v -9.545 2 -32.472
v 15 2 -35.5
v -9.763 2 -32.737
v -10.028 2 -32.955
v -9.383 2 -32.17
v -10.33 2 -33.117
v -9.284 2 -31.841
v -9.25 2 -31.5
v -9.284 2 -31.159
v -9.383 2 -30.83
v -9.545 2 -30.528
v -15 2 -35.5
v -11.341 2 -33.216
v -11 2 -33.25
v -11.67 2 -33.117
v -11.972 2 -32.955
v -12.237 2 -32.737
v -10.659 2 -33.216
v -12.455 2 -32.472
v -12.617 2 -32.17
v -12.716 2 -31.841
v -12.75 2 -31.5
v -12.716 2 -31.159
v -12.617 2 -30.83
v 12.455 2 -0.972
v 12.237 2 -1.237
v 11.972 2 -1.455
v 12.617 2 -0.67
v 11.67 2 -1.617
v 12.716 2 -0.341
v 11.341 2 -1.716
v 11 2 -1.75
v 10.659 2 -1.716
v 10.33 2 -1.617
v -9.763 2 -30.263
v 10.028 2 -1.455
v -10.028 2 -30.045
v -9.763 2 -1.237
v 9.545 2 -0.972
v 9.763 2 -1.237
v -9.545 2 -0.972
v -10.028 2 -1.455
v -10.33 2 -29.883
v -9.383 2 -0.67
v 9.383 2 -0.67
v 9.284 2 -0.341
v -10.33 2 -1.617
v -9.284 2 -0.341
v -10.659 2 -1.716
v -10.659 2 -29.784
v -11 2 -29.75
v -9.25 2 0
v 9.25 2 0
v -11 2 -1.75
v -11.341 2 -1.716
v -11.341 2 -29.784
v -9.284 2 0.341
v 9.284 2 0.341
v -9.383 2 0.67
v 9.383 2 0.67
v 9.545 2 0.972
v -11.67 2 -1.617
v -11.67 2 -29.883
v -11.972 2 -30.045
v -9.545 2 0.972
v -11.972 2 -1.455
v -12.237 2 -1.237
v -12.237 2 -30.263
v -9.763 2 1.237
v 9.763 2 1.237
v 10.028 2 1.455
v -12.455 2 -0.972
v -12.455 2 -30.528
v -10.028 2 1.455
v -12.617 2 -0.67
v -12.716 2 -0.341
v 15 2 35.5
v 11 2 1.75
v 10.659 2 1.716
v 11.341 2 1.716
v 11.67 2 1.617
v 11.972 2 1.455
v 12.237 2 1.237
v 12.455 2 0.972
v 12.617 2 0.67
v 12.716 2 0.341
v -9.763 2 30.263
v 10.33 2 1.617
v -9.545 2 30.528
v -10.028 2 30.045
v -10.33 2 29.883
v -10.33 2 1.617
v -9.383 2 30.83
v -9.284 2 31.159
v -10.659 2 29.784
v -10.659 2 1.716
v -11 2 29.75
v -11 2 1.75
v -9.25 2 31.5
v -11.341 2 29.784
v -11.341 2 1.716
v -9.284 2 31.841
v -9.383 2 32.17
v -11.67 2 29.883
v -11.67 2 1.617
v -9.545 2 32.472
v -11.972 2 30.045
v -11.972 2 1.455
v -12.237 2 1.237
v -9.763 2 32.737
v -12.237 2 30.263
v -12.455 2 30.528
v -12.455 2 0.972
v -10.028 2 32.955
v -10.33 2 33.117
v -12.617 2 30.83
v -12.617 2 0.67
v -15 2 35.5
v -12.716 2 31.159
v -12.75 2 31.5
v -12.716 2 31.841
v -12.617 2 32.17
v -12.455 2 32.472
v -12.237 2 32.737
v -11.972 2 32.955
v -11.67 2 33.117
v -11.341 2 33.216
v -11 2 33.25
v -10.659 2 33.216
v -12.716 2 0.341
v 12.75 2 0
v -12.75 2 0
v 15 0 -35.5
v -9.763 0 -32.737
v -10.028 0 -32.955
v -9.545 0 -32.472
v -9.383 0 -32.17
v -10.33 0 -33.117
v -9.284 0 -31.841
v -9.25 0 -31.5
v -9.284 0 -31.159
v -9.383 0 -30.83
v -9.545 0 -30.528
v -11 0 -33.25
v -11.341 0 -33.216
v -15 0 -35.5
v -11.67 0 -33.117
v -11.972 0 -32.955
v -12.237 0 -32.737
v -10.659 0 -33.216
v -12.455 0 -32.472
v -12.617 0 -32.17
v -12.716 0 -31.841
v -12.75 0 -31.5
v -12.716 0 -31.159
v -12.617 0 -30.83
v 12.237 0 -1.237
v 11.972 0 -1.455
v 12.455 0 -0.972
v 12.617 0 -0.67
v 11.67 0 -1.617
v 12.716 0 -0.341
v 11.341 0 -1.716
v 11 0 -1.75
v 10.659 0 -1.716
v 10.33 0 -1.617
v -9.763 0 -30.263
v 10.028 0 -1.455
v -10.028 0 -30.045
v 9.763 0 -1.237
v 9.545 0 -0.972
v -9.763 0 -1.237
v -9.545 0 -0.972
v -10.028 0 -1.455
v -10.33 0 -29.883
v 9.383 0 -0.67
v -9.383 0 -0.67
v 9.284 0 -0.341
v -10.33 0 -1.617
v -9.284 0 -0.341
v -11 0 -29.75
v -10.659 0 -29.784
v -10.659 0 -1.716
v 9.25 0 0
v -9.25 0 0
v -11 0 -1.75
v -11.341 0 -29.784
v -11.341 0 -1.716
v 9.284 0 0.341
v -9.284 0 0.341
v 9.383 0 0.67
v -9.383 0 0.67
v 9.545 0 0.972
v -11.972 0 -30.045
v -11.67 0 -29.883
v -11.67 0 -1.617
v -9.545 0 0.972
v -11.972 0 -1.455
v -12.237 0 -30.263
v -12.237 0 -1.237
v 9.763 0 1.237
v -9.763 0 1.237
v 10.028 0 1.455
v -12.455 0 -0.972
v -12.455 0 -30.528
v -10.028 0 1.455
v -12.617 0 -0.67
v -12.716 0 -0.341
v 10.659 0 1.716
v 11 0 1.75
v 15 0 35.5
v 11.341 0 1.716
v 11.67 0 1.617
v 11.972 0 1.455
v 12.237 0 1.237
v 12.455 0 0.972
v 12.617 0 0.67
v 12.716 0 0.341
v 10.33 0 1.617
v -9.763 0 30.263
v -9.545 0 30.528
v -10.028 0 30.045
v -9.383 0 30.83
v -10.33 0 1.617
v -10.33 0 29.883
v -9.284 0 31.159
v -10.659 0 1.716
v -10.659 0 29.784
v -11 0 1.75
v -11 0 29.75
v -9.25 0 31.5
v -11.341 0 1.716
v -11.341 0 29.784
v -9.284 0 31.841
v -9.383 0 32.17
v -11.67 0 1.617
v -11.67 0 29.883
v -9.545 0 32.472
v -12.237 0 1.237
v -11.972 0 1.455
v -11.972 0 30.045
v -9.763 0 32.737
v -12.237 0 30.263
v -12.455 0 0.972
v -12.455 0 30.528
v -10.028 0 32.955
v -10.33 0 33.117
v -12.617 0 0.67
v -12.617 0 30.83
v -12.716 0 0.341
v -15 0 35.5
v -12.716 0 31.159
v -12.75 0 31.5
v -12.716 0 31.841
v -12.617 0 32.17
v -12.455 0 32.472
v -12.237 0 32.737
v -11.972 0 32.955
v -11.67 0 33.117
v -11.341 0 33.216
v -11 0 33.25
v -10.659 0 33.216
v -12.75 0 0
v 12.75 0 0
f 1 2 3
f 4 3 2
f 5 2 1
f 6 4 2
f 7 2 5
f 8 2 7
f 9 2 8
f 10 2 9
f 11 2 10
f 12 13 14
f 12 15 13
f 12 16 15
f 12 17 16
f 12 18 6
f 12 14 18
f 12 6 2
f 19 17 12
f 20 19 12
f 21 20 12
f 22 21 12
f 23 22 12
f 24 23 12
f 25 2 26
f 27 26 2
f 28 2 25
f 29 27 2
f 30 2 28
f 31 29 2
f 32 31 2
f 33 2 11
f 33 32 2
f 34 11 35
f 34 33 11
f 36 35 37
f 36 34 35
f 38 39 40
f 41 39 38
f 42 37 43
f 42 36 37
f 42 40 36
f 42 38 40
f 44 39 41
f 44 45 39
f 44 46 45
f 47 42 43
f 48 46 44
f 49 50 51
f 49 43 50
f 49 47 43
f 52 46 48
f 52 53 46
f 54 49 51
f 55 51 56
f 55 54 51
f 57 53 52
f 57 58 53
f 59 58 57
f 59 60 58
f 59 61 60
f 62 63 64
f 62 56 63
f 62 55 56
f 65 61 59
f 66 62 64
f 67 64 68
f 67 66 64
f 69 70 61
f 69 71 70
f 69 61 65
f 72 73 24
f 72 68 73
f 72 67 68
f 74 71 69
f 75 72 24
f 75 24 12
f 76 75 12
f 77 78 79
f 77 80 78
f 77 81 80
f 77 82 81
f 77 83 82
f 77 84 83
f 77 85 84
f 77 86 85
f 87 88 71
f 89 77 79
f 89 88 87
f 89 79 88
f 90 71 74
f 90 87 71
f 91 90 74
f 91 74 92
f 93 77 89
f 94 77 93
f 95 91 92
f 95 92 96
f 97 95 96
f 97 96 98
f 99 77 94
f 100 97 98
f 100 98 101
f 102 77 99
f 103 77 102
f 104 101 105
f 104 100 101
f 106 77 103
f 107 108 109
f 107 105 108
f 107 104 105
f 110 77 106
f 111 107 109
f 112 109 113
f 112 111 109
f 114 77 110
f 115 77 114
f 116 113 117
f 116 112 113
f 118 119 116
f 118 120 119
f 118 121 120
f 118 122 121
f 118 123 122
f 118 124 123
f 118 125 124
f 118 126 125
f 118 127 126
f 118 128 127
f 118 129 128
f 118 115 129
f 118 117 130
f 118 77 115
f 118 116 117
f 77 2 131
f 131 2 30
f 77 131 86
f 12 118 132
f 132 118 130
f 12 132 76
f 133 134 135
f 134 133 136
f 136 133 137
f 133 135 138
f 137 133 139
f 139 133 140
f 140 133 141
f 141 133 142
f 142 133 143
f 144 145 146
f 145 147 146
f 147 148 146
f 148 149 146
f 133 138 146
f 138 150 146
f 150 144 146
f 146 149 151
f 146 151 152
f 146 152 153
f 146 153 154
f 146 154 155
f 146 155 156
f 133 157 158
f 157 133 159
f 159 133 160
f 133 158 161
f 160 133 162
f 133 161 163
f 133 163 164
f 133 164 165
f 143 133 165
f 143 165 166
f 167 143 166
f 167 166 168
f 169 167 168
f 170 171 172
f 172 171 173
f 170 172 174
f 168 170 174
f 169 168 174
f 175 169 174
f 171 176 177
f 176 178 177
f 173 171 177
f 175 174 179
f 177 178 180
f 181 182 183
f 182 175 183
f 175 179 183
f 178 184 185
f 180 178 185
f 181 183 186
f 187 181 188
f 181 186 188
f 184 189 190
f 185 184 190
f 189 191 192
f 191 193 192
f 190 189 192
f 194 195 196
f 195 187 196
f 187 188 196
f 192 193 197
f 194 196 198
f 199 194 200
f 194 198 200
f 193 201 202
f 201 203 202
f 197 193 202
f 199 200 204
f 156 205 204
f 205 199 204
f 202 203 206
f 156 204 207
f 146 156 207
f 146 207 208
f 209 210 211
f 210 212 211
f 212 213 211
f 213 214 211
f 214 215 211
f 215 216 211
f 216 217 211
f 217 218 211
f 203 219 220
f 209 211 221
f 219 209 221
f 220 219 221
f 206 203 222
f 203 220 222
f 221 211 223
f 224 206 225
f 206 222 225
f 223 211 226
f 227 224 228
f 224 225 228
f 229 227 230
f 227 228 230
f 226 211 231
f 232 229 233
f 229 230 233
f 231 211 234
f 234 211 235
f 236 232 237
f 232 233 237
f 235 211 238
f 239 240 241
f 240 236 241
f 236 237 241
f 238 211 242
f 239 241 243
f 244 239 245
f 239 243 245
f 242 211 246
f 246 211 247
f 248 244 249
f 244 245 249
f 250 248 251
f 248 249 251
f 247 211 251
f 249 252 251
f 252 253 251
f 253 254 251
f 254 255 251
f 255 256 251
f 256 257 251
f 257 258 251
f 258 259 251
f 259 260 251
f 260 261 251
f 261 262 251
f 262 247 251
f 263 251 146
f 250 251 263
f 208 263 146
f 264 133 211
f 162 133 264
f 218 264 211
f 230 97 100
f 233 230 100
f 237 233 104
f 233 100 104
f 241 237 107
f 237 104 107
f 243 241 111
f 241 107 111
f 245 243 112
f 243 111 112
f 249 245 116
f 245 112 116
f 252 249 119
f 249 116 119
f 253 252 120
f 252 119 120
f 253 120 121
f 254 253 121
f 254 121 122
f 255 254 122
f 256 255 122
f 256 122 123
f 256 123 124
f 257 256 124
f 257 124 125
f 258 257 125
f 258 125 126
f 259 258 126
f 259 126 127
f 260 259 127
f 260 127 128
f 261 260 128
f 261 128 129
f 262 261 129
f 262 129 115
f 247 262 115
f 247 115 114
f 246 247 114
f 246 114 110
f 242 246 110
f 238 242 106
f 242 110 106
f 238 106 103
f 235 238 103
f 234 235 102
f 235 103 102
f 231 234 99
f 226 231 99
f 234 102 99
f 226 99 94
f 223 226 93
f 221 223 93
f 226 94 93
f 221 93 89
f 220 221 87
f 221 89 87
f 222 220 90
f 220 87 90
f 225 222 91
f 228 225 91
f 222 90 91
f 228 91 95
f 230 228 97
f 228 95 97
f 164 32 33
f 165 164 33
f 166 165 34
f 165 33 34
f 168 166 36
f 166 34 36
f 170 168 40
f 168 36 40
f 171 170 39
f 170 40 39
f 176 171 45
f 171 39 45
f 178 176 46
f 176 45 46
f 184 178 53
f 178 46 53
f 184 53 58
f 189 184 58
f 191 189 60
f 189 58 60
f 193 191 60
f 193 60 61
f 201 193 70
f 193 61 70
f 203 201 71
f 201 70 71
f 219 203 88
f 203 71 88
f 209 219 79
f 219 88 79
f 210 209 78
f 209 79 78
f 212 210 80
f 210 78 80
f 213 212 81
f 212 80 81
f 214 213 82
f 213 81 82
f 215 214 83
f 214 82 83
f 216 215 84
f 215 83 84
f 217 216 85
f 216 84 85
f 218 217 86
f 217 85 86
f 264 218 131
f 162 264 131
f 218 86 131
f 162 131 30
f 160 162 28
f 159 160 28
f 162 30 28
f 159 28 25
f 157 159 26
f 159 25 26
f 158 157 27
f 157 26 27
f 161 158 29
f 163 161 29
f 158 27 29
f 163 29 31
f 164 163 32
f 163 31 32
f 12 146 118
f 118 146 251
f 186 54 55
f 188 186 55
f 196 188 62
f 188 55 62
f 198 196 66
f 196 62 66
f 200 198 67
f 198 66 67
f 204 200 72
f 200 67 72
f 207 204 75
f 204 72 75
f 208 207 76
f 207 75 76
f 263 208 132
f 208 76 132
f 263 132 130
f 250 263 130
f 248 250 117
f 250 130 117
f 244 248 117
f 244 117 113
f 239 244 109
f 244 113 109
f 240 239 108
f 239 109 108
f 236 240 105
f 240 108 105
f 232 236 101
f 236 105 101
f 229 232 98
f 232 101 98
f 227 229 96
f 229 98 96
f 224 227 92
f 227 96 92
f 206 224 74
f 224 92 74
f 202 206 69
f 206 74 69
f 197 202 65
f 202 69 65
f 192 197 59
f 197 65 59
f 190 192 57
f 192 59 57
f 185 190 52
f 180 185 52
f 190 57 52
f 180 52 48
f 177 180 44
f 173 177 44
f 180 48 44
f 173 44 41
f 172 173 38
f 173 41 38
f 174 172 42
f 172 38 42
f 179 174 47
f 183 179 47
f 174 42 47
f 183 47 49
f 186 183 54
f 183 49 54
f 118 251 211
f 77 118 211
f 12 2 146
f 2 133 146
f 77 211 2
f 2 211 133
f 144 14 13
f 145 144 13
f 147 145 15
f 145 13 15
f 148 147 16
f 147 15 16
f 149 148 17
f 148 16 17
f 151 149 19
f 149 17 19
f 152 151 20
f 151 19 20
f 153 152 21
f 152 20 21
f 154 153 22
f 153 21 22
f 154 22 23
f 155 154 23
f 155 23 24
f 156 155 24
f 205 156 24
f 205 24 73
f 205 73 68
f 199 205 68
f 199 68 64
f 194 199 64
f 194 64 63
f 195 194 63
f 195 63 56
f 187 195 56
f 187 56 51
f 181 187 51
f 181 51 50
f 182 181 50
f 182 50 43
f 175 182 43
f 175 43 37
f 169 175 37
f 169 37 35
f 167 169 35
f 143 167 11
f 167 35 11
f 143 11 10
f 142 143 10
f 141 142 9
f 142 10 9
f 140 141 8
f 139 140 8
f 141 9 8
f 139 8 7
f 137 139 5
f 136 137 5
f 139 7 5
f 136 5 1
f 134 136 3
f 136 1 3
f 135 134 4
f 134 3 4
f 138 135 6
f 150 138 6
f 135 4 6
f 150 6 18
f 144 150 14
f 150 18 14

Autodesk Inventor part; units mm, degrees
ref_plane "YZ Plane" through (0, 0, 0) normal (1, 0, 0) x (0, 1, 0)
ref_plane "XZ Plane" through (0, 0, 0) normal (0, 1, 0) x (-1, 0, 0)
ref_plane "XY Plane" through (0, 0, 0) normal (0, 0, 1) x (1, 0, 0)
sketch "Szkic1" plane through (0, 0, 0) normal (0, 1, 0) x (-1, 0, 0)
  line L0 (-15, -35.5) -> (15, -35.5)
  line L1 (15, -35.5) -> (15, 35.5)
  line L2 (15, 35.5) -> (-15, 35.5)
  line L3 (-15, 35.5) -> (-15, -35.5)
  line L4 (-15, -35.5) -> (15, 35.5) construction
  line L5 (15, -35.5) -> (-15, 35.5) construction
  point P0 (0, 0)
  dimension "d0" = 30
  dimension "d1" = 71
extrude "Wyciągnięcie proste1" add sketch "Szkic1" along normal blind 2
sketch "Szkic2" plane through (0, 0, 0) normal (0, -1, 0) x (1, 0, 0)
  circle A0 centre (11, 0) radius 1.5 projected
  circle A1 centre (19, -31.5) radius 1.5 projected
  circle A2 centre (-11, 31.5) radius 1.5 projected
  circle A3 centre (-11, -31.5) radius 1.5 projected
  circle A4 centre (19, 31.5) radius 1.5 projected
  circle A5 centre (-11, 0) radius 1.5 projected
  line L0 (23.5, -35.5) -> (-15.5, -35.5) projected
  line L1 (23.5, 35.5) -> (23.5, -35.5) projected
  line L2 (-15.5, 35.5) -> (23.5, 35.5) projected
  line L3 (-15.5, -35.5) -> (-15.5, 35.5) projected
  point P0 (0, 0)
hole "Otwór1" at (11, 0, 0) at (-11, 0, 0) at (-11, 0, 31.5) at (-11, 0, -31.5) direction (0, 1, 0) diameter 3.5 end through all
properties part number "docisk do mostka"
